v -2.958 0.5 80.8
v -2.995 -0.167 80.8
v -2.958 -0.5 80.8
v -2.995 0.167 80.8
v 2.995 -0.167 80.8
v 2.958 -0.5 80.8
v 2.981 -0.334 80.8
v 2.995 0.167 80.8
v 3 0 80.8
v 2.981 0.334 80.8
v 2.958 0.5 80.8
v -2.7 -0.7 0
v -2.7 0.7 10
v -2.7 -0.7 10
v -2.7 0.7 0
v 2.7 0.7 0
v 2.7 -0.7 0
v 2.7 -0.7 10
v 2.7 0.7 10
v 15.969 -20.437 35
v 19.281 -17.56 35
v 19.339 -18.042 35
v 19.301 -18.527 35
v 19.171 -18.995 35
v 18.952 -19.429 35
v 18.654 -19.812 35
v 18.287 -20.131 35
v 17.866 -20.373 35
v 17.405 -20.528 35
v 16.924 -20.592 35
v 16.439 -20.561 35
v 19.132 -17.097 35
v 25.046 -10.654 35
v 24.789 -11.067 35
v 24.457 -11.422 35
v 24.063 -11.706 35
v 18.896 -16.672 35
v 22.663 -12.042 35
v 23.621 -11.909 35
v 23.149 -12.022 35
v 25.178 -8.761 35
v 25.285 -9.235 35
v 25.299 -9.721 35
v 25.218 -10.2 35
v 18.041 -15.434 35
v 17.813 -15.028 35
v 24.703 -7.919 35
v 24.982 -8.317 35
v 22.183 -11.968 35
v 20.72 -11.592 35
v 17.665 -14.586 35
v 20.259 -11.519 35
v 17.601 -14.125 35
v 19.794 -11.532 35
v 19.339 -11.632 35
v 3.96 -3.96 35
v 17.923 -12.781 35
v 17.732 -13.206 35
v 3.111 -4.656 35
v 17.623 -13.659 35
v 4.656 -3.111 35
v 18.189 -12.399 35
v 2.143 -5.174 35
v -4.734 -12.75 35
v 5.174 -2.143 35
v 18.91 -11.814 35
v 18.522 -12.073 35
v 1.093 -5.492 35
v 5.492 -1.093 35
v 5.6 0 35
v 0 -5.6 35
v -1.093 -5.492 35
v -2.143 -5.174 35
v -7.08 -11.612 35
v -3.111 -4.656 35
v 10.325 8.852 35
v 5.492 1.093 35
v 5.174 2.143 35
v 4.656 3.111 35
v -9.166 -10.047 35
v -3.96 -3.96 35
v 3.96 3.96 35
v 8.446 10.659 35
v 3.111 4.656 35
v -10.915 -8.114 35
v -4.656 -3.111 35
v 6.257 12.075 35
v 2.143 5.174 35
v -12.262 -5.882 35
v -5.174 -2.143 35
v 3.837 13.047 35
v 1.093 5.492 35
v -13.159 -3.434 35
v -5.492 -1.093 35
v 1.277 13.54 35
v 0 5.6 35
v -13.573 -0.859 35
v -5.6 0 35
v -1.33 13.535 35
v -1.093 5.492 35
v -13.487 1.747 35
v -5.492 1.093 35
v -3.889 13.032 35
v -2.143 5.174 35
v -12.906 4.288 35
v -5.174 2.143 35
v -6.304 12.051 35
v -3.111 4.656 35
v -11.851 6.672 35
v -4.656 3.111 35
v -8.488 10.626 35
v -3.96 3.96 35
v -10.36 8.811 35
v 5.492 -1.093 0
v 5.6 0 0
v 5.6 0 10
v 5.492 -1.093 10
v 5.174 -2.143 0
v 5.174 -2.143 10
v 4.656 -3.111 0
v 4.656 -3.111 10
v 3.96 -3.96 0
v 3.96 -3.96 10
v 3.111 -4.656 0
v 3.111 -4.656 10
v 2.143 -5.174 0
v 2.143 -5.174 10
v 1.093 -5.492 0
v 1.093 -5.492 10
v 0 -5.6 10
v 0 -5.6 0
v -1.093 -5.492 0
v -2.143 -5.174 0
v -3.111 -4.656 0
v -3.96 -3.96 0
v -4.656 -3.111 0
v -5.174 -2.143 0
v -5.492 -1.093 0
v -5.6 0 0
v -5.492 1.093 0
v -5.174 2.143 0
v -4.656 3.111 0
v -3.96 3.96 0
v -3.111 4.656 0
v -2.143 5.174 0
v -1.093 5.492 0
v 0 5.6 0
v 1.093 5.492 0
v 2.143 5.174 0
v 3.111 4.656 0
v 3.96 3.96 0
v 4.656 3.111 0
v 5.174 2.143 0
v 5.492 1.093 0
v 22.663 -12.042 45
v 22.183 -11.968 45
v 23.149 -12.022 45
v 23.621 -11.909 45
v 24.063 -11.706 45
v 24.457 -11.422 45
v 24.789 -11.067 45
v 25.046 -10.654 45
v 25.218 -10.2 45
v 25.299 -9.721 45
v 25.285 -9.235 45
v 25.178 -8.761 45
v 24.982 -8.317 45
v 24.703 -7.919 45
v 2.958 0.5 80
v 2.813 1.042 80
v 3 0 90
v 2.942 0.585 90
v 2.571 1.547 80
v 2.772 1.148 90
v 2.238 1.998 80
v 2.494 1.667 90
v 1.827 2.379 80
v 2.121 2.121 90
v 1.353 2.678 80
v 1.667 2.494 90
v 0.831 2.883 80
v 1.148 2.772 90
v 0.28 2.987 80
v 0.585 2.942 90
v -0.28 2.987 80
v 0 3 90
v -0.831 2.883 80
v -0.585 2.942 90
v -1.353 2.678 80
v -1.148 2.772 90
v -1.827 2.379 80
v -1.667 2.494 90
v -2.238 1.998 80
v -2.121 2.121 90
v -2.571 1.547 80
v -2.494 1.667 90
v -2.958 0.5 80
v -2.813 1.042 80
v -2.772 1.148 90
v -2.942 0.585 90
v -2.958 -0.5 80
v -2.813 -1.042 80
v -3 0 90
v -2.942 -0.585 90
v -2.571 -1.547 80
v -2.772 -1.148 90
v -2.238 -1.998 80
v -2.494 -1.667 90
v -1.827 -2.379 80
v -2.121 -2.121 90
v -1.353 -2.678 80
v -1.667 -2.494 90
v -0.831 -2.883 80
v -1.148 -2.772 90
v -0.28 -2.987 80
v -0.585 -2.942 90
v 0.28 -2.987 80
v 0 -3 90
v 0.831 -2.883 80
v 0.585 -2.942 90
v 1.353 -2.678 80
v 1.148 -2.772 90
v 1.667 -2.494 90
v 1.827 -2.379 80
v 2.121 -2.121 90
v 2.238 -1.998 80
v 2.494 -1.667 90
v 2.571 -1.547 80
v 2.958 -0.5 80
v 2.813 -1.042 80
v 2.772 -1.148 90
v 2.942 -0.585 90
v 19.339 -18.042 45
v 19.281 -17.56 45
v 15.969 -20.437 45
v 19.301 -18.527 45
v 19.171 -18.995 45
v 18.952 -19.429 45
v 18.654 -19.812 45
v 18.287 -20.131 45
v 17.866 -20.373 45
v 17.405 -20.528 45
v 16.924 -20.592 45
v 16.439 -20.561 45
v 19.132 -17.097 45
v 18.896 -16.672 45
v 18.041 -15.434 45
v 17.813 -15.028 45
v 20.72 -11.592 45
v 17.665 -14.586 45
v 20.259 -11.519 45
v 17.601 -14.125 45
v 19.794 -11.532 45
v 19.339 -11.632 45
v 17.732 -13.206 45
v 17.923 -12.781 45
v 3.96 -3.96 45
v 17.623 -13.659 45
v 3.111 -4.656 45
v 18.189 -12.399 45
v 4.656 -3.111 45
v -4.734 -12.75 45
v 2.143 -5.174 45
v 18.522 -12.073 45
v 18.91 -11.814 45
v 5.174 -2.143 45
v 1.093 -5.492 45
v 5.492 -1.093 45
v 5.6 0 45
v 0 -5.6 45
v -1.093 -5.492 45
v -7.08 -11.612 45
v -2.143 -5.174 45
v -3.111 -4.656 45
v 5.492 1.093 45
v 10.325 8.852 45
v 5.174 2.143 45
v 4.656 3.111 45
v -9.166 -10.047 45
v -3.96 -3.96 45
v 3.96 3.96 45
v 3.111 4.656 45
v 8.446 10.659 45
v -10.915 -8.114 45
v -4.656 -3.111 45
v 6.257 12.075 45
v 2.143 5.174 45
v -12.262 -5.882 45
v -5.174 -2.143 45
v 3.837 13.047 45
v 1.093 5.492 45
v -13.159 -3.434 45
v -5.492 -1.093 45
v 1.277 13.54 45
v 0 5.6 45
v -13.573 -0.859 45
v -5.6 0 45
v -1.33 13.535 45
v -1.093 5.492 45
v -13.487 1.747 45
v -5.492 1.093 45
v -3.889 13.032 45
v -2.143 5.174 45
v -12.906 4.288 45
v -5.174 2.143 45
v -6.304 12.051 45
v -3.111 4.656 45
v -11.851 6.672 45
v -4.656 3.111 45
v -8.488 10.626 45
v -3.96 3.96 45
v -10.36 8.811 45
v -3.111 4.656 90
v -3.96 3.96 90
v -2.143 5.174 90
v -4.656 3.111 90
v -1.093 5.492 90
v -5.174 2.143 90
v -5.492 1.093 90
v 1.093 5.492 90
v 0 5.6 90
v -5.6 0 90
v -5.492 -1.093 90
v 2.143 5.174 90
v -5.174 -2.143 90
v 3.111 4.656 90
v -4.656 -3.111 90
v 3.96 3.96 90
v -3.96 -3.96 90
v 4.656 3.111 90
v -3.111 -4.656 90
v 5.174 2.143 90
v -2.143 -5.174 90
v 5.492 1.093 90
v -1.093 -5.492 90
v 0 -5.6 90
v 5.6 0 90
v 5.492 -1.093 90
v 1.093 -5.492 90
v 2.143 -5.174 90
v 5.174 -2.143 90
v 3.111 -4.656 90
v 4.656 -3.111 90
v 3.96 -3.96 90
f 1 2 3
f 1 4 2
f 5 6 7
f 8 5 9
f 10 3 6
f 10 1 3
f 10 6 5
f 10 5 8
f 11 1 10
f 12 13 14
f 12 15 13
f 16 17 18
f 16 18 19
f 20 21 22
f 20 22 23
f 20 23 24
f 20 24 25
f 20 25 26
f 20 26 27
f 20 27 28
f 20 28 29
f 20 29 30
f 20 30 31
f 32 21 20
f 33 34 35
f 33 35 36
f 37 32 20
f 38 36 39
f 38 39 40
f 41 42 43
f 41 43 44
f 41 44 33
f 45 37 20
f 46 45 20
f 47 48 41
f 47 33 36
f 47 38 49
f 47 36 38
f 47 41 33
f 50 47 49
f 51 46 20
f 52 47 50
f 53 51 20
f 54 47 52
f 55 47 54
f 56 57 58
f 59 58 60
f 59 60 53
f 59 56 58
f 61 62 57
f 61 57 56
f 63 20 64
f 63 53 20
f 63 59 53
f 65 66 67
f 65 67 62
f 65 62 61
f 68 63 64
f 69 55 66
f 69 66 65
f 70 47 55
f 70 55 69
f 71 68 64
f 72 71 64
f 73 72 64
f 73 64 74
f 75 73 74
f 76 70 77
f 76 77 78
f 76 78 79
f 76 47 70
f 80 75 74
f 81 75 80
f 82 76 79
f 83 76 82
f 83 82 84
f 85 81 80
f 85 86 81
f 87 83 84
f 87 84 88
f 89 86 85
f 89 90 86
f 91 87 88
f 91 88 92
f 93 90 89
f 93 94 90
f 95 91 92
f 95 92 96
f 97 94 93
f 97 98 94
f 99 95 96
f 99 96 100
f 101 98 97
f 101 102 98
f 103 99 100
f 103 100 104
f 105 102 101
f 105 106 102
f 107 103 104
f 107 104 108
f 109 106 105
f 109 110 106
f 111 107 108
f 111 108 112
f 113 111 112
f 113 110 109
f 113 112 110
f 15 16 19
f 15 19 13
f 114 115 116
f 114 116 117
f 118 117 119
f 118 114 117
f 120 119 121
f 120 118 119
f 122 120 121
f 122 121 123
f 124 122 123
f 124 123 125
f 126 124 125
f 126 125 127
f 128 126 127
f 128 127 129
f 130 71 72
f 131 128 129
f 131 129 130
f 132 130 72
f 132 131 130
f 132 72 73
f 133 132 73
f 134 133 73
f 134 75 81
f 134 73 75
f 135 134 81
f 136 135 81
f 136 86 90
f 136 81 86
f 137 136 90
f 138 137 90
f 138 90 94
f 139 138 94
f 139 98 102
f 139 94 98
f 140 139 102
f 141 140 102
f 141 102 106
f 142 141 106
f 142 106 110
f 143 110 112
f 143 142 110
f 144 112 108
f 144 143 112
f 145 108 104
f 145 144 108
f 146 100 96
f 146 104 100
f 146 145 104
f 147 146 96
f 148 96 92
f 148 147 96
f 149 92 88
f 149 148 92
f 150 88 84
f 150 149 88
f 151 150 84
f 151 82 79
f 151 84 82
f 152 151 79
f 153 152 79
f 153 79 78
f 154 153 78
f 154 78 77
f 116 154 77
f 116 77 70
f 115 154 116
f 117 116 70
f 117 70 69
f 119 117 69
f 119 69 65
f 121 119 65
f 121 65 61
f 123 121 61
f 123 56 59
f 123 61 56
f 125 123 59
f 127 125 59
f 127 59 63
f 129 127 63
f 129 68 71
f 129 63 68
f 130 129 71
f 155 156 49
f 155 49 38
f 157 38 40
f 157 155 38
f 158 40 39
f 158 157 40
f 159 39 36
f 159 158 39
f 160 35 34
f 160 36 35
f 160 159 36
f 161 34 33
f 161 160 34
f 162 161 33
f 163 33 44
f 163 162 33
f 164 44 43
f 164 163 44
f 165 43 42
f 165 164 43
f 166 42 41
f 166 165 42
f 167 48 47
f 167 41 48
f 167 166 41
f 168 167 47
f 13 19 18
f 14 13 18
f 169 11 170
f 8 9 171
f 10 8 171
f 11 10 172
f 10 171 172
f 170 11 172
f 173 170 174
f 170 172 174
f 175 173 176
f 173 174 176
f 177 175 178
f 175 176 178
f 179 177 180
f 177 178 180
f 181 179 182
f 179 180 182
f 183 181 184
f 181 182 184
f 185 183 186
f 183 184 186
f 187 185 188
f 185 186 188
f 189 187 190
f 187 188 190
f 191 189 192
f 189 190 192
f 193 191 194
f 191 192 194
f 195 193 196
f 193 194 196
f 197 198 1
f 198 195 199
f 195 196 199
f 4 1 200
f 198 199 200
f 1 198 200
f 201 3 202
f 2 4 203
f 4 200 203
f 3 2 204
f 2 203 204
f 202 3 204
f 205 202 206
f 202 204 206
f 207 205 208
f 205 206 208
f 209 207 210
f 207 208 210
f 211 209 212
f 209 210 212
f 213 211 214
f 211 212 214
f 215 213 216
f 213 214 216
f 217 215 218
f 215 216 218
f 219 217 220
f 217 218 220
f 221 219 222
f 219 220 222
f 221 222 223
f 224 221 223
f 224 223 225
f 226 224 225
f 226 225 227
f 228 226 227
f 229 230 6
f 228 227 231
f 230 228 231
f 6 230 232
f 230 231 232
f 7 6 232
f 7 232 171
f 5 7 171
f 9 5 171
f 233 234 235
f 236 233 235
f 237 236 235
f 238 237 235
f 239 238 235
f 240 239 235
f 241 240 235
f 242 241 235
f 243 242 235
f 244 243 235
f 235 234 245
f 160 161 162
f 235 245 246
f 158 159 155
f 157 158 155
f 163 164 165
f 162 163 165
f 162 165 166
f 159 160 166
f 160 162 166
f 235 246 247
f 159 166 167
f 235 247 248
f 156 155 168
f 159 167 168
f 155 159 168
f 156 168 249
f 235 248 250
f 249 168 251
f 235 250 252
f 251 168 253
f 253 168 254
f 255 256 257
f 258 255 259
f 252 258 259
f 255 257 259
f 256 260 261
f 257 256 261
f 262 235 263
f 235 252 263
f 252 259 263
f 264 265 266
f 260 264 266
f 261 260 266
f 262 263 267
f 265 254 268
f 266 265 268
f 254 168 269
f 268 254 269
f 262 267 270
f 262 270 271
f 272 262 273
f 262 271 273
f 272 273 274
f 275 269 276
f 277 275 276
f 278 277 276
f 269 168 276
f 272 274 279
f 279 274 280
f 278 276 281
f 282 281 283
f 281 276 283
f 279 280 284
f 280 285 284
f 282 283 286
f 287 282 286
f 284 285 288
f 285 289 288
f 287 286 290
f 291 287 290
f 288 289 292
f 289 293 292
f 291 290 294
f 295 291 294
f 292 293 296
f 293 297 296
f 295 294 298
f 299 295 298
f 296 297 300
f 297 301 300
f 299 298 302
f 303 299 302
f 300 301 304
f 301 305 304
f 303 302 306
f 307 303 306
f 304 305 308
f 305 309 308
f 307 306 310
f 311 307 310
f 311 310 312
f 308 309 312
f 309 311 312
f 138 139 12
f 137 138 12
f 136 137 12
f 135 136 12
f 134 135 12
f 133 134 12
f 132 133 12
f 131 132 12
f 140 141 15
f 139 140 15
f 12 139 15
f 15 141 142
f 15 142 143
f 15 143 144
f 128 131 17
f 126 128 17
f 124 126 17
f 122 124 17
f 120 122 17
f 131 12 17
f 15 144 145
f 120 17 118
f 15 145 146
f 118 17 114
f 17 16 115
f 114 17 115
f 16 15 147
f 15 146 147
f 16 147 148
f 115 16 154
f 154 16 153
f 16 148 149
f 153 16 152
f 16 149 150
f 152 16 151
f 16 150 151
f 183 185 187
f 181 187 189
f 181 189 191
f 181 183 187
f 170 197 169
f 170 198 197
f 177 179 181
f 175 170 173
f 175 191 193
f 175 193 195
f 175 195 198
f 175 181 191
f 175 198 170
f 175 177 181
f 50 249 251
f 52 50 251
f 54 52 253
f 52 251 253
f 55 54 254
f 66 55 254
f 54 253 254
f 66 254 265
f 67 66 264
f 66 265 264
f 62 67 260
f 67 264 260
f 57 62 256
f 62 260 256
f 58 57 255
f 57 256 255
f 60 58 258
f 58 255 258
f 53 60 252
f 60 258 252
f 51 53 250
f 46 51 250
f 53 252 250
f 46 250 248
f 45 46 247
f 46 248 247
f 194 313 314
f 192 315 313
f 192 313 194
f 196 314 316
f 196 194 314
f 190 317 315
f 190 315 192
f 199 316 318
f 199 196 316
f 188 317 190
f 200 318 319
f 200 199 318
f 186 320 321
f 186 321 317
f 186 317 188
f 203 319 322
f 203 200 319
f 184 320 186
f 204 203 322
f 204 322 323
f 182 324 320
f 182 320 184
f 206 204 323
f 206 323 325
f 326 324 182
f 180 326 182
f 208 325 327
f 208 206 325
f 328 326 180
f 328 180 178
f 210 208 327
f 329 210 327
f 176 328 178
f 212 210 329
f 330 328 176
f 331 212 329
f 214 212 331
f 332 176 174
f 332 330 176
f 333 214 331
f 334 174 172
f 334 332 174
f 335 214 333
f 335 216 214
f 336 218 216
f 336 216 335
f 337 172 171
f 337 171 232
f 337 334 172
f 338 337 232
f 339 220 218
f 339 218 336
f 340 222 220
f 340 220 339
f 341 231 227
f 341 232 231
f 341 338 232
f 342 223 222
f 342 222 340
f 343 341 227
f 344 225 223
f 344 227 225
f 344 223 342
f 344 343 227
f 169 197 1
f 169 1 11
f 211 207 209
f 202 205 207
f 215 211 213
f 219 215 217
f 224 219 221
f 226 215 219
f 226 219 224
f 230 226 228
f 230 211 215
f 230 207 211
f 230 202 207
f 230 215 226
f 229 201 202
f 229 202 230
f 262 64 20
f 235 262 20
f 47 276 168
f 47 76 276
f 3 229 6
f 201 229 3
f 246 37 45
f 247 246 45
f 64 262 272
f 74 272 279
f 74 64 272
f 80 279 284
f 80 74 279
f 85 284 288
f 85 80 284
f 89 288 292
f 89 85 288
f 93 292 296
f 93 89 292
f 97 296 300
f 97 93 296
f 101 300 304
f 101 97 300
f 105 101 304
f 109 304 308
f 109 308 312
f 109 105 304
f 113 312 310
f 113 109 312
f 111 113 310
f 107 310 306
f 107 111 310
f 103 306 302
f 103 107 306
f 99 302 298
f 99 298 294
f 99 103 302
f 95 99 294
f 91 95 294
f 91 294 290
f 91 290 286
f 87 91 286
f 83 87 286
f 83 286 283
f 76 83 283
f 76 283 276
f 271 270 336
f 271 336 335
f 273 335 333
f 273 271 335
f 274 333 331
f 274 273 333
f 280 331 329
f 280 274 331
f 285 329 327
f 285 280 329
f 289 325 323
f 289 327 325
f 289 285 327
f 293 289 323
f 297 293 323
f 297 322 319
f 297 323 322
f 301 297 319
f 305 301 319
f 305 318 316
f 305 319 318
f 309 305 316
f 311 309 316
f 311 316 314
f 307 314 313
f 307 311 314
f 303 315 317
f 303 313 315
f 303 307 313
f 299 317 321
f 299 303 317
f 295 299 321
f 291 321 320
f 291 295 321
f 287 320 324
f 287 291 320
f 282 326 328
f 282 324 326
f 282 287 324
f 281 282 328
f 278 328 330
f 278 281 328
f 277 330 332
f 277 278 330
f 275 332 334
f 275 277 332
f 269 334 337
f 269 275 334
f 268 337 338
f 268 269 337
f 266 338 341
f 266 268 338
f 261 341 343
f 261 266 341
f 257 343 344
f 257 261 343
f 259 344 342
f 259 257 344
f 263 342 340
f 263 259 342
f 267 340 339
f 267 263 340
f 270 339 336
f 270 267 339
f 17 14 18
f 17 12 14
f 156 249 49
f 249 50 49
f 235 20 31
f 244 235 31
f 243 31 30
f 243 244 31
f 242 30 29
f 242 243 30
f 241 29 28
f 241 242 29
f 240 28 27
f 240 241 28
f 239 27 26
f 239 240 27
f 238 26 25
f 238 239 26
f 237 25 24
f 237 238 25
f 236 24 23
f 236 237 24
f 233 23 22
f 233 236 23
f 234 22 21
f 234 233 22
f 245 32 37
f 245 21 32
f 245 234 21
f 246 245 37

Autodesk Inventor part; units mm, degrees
ref_plane "YZ Plane" through (0, 0, 0) normal (1, 0, 0) x (0, 1, 0)
ref_plane "XZ Plane" through (0, 0, 0) normal (0, 1, 0) x (-1, 0, 0)
sketch "Sketch1" plane through (0, 0, 0) normal (0, 0, 1) x (1, 0, 0)
  line L0 (2.6, -0.6) -> (-2.6, -0.6) projected
  line L1 (-2.6, -0.6) -> (-2.6, 0.6) projected
  line L2 (-2.6, 0.6) -> (2.6, 0.6) projected
  line L3 (2.6, 0.6) -> (2.6, -0.6) projected
  circle A0 centre (0, 0) radius 3.6 projected
  line L4 (-2.7, 0.7) -> (-2.7, -0.7)
  line L5 (-2.7, -0.7) -> (2.7, -0.7)
  line L6 (2.7, -0.7) -> (2.7, 0.7)
  line L7 (2.7, 0.7) -> (-2.7, 0.7)
  circle A1 centre (0, 0) radius 5.6
  dimension "d0" = 0.1
  dimension "d5" = 2
extrude "Extrusion1" add sketch "Sketch1" along normal blind 10 contours A0 | A1
sketch "Sketch2" plane through (0, 0, 10) normal (0, 0, 1) x (0, -1, 0)
  line L0 (-0.7, -2.7) -> (-0.7, 2.7) projected
  line L1 (-0.7, 2.7) -> (0.7, 2.7) projected
  line L2 (0.7, 2.7) -> (0.7, -2.7) projected
  line L3 (0.7, -2.7) -> (-0.7, -2.7) projected
  circle A0 centre (0, 0) radius 3.75
  circle A1 centre (0, 0) radius 5.6 projected
ref_plane "Work Plane1" through (-14, -11, 93) normal (0, 0, -1) x (0, 1, 0)
extrude "Extrusion2" add sketch "Sketch2" along normal blind 80 contours L0 L1 L2 L3 | A0 | A1
ref_plane "Work Plane2" through (14.5169, -8.0562, 35) normal (0, 0, -1) x (-1, 0, 0)
sketch "Sketch4" plane through (0, 0, 90) normal (0, 0, 1) x (1, 0, 0)
  circle A0 centre (0, 0) radius 3
  dimension "d20" = 6
extrude "Extrusion4" cut sketch "Sketch4" against normal blind 10
sketch "Sketch5" plane through (0, 0, 80) normal (0, 0, 1) x (1, 0, 0)
  circle A0 centre (0, 0) radius 3 projected
  circle A1 centre (0, 0) radius 3 projected
  line L0 (-3, 0.5) -> (3, 0.5)
  line L1 (3, 0.5) -> (3, -0.5)
  line L2 (3, -0.5) -> (-3, -0.5)
  line L3 (-3, -0.5) -> (-3, 0.5)
  line L4 (-3, 0.5) -> (3, -0.5) construction
  line L5 (3, 0.5) -> (-3, -0.5) construction
  point P0 (-2.958, -0.5)
  point P1 (2.958, -0.5)
  point P2 (2.958, 0.5)
  point P3 (-2.958, 0.5)
  dimension "d24" = 6
  dimension "d25" = 1
extrude "Extrusion5" add sketch "Sketch5" along normal blind 0.8 contours A0 L2 L0
sketch "Sketch6" plane through (14.5169, -8.0562, 35) normal (0, 0, -1) x (-1, 0, 0)
  circle A0 centre (14.5169, 8.0562) radius 5.6 projected
  circle A1 centre (14.5169, 8.0562) radius 13.6
  line L0 (19.2509, -4.6933) -> (-8.8851, -15.1405)
  line L1 (4.1919, 16.9079) -> (-15.3464, -5.8823)
  line L2 (-8.8851, -15.1405) -> (0.2779, -1.8727)
  line L3 (0.2779, -1.8727) -> (-15.3464, -5.8823)
  line L4 (20.3441, -4.2322) -> (-52.8556, -38.9438)
  line L5 (4.1919, 16.9079) -> (-52.8556, -38.9438)
  arc A2 (-101.4982, -27.3726) -> (-98.3101, -29.4028) centre (-99.5525, -27.8355) ccw
  arc A3 (-98.7514, -19.105) -> (-101.4982, -27.3726) centre (-52.8556, -38.9438) ccw
  line L6 (-98.7514, -19.105) -> (-109.7663, -14.3437)
  arc A4 (-98.2472, 3.2889) -> (-109.7663, -14.3437) centre (-52.8556, -38.9438) ccw
  line L7 (-98.2472, 3.2889) -> (-89.4617, -4.8852)
  arc A5 (-18.7969, -2.3377) -> (-89.4617, -4.8852) centre (-52.8556, -38.9438) ccw
  line L8 (-18.7969, -2.3377) -> (-26.971, -11.1232)
  arc A6 (-41.1368, -75.0917) -> (-26.971, -11.1232) centre (-52.8556, -38.9438) ccw
  line L9 (-41.1368, -75.0917) -> (-42.3055, -71.487)
  arc A7 (-42.3055, -71.487) -> (-59.8761, -67.1138) centre (-52.9931, -76.9436) ccw
  arc A8 (-61.0624, -66.7913) -> (-59.8761, -67.1138) centre (-60.3349, -66.4585) ccw
  arc A9 (-61.0624, -66.7913) -> (-73.0205, -59.8295) centre (-71.9745, -71.7838) ccw
  arc A10 (-73.8866, -58.957) -> (-73.0205, -59.8295) centre (-73.0902, -59.0325) ccw
  arc A11 (-73.8866, -58.957) -> (-80.7617, -46.9489) centre (-85.8331, -57.8246) ccw
  arc A12 (-81.0756, -45.7602) -> (-80.7617, -46.9489) centre (-80.4236, -46.2238) ccw
  arc A13 (-81.0756, -45.7602) -> (-85.3215, -28.1585) centre (-90.8553, -38.8063) ccw
  line L10 (-85.3215, -28.1585) -> (-88.9177, -26.9638)
  arc A14 (-88.9177, -26.9638) -> (-98.3101, -29.4028) centre (-90.8553, -38.8063) ccw
  circle A15 centre (-52.8556, -38.9438) radius 4
  circle A16 centre (-52.8556, -38.9438) radius 18
  circle A17 centre (-52.8556, -38.9438) radius 50
  line L11 (0.2779, -1.8727) -> (-52.8556, -38.9438)
  point P0 (2.5698, 1.558)
  point P1 (4.2932, -0.9124)
  dimension "d30" = 8
  dimension "d34" = 35
  dimension "d36" = 5
  dimension "d37" = 5
  dimension "d39" = 35
extrude "Extrusion6" add sketch "Sketch6" against normal blind 10 contours A1 | A1 L0 L2 L3 L1
fillet "Fillet1" radius 2.5 3 edges at (23.402, -23.1967, 40) (29.8633, -13.9385, 40) (14.2391, -9.9288, 40)
equation "\"d37\" = d36"
equation "\"d39\" = d34"
properties part number "reverser-base"
